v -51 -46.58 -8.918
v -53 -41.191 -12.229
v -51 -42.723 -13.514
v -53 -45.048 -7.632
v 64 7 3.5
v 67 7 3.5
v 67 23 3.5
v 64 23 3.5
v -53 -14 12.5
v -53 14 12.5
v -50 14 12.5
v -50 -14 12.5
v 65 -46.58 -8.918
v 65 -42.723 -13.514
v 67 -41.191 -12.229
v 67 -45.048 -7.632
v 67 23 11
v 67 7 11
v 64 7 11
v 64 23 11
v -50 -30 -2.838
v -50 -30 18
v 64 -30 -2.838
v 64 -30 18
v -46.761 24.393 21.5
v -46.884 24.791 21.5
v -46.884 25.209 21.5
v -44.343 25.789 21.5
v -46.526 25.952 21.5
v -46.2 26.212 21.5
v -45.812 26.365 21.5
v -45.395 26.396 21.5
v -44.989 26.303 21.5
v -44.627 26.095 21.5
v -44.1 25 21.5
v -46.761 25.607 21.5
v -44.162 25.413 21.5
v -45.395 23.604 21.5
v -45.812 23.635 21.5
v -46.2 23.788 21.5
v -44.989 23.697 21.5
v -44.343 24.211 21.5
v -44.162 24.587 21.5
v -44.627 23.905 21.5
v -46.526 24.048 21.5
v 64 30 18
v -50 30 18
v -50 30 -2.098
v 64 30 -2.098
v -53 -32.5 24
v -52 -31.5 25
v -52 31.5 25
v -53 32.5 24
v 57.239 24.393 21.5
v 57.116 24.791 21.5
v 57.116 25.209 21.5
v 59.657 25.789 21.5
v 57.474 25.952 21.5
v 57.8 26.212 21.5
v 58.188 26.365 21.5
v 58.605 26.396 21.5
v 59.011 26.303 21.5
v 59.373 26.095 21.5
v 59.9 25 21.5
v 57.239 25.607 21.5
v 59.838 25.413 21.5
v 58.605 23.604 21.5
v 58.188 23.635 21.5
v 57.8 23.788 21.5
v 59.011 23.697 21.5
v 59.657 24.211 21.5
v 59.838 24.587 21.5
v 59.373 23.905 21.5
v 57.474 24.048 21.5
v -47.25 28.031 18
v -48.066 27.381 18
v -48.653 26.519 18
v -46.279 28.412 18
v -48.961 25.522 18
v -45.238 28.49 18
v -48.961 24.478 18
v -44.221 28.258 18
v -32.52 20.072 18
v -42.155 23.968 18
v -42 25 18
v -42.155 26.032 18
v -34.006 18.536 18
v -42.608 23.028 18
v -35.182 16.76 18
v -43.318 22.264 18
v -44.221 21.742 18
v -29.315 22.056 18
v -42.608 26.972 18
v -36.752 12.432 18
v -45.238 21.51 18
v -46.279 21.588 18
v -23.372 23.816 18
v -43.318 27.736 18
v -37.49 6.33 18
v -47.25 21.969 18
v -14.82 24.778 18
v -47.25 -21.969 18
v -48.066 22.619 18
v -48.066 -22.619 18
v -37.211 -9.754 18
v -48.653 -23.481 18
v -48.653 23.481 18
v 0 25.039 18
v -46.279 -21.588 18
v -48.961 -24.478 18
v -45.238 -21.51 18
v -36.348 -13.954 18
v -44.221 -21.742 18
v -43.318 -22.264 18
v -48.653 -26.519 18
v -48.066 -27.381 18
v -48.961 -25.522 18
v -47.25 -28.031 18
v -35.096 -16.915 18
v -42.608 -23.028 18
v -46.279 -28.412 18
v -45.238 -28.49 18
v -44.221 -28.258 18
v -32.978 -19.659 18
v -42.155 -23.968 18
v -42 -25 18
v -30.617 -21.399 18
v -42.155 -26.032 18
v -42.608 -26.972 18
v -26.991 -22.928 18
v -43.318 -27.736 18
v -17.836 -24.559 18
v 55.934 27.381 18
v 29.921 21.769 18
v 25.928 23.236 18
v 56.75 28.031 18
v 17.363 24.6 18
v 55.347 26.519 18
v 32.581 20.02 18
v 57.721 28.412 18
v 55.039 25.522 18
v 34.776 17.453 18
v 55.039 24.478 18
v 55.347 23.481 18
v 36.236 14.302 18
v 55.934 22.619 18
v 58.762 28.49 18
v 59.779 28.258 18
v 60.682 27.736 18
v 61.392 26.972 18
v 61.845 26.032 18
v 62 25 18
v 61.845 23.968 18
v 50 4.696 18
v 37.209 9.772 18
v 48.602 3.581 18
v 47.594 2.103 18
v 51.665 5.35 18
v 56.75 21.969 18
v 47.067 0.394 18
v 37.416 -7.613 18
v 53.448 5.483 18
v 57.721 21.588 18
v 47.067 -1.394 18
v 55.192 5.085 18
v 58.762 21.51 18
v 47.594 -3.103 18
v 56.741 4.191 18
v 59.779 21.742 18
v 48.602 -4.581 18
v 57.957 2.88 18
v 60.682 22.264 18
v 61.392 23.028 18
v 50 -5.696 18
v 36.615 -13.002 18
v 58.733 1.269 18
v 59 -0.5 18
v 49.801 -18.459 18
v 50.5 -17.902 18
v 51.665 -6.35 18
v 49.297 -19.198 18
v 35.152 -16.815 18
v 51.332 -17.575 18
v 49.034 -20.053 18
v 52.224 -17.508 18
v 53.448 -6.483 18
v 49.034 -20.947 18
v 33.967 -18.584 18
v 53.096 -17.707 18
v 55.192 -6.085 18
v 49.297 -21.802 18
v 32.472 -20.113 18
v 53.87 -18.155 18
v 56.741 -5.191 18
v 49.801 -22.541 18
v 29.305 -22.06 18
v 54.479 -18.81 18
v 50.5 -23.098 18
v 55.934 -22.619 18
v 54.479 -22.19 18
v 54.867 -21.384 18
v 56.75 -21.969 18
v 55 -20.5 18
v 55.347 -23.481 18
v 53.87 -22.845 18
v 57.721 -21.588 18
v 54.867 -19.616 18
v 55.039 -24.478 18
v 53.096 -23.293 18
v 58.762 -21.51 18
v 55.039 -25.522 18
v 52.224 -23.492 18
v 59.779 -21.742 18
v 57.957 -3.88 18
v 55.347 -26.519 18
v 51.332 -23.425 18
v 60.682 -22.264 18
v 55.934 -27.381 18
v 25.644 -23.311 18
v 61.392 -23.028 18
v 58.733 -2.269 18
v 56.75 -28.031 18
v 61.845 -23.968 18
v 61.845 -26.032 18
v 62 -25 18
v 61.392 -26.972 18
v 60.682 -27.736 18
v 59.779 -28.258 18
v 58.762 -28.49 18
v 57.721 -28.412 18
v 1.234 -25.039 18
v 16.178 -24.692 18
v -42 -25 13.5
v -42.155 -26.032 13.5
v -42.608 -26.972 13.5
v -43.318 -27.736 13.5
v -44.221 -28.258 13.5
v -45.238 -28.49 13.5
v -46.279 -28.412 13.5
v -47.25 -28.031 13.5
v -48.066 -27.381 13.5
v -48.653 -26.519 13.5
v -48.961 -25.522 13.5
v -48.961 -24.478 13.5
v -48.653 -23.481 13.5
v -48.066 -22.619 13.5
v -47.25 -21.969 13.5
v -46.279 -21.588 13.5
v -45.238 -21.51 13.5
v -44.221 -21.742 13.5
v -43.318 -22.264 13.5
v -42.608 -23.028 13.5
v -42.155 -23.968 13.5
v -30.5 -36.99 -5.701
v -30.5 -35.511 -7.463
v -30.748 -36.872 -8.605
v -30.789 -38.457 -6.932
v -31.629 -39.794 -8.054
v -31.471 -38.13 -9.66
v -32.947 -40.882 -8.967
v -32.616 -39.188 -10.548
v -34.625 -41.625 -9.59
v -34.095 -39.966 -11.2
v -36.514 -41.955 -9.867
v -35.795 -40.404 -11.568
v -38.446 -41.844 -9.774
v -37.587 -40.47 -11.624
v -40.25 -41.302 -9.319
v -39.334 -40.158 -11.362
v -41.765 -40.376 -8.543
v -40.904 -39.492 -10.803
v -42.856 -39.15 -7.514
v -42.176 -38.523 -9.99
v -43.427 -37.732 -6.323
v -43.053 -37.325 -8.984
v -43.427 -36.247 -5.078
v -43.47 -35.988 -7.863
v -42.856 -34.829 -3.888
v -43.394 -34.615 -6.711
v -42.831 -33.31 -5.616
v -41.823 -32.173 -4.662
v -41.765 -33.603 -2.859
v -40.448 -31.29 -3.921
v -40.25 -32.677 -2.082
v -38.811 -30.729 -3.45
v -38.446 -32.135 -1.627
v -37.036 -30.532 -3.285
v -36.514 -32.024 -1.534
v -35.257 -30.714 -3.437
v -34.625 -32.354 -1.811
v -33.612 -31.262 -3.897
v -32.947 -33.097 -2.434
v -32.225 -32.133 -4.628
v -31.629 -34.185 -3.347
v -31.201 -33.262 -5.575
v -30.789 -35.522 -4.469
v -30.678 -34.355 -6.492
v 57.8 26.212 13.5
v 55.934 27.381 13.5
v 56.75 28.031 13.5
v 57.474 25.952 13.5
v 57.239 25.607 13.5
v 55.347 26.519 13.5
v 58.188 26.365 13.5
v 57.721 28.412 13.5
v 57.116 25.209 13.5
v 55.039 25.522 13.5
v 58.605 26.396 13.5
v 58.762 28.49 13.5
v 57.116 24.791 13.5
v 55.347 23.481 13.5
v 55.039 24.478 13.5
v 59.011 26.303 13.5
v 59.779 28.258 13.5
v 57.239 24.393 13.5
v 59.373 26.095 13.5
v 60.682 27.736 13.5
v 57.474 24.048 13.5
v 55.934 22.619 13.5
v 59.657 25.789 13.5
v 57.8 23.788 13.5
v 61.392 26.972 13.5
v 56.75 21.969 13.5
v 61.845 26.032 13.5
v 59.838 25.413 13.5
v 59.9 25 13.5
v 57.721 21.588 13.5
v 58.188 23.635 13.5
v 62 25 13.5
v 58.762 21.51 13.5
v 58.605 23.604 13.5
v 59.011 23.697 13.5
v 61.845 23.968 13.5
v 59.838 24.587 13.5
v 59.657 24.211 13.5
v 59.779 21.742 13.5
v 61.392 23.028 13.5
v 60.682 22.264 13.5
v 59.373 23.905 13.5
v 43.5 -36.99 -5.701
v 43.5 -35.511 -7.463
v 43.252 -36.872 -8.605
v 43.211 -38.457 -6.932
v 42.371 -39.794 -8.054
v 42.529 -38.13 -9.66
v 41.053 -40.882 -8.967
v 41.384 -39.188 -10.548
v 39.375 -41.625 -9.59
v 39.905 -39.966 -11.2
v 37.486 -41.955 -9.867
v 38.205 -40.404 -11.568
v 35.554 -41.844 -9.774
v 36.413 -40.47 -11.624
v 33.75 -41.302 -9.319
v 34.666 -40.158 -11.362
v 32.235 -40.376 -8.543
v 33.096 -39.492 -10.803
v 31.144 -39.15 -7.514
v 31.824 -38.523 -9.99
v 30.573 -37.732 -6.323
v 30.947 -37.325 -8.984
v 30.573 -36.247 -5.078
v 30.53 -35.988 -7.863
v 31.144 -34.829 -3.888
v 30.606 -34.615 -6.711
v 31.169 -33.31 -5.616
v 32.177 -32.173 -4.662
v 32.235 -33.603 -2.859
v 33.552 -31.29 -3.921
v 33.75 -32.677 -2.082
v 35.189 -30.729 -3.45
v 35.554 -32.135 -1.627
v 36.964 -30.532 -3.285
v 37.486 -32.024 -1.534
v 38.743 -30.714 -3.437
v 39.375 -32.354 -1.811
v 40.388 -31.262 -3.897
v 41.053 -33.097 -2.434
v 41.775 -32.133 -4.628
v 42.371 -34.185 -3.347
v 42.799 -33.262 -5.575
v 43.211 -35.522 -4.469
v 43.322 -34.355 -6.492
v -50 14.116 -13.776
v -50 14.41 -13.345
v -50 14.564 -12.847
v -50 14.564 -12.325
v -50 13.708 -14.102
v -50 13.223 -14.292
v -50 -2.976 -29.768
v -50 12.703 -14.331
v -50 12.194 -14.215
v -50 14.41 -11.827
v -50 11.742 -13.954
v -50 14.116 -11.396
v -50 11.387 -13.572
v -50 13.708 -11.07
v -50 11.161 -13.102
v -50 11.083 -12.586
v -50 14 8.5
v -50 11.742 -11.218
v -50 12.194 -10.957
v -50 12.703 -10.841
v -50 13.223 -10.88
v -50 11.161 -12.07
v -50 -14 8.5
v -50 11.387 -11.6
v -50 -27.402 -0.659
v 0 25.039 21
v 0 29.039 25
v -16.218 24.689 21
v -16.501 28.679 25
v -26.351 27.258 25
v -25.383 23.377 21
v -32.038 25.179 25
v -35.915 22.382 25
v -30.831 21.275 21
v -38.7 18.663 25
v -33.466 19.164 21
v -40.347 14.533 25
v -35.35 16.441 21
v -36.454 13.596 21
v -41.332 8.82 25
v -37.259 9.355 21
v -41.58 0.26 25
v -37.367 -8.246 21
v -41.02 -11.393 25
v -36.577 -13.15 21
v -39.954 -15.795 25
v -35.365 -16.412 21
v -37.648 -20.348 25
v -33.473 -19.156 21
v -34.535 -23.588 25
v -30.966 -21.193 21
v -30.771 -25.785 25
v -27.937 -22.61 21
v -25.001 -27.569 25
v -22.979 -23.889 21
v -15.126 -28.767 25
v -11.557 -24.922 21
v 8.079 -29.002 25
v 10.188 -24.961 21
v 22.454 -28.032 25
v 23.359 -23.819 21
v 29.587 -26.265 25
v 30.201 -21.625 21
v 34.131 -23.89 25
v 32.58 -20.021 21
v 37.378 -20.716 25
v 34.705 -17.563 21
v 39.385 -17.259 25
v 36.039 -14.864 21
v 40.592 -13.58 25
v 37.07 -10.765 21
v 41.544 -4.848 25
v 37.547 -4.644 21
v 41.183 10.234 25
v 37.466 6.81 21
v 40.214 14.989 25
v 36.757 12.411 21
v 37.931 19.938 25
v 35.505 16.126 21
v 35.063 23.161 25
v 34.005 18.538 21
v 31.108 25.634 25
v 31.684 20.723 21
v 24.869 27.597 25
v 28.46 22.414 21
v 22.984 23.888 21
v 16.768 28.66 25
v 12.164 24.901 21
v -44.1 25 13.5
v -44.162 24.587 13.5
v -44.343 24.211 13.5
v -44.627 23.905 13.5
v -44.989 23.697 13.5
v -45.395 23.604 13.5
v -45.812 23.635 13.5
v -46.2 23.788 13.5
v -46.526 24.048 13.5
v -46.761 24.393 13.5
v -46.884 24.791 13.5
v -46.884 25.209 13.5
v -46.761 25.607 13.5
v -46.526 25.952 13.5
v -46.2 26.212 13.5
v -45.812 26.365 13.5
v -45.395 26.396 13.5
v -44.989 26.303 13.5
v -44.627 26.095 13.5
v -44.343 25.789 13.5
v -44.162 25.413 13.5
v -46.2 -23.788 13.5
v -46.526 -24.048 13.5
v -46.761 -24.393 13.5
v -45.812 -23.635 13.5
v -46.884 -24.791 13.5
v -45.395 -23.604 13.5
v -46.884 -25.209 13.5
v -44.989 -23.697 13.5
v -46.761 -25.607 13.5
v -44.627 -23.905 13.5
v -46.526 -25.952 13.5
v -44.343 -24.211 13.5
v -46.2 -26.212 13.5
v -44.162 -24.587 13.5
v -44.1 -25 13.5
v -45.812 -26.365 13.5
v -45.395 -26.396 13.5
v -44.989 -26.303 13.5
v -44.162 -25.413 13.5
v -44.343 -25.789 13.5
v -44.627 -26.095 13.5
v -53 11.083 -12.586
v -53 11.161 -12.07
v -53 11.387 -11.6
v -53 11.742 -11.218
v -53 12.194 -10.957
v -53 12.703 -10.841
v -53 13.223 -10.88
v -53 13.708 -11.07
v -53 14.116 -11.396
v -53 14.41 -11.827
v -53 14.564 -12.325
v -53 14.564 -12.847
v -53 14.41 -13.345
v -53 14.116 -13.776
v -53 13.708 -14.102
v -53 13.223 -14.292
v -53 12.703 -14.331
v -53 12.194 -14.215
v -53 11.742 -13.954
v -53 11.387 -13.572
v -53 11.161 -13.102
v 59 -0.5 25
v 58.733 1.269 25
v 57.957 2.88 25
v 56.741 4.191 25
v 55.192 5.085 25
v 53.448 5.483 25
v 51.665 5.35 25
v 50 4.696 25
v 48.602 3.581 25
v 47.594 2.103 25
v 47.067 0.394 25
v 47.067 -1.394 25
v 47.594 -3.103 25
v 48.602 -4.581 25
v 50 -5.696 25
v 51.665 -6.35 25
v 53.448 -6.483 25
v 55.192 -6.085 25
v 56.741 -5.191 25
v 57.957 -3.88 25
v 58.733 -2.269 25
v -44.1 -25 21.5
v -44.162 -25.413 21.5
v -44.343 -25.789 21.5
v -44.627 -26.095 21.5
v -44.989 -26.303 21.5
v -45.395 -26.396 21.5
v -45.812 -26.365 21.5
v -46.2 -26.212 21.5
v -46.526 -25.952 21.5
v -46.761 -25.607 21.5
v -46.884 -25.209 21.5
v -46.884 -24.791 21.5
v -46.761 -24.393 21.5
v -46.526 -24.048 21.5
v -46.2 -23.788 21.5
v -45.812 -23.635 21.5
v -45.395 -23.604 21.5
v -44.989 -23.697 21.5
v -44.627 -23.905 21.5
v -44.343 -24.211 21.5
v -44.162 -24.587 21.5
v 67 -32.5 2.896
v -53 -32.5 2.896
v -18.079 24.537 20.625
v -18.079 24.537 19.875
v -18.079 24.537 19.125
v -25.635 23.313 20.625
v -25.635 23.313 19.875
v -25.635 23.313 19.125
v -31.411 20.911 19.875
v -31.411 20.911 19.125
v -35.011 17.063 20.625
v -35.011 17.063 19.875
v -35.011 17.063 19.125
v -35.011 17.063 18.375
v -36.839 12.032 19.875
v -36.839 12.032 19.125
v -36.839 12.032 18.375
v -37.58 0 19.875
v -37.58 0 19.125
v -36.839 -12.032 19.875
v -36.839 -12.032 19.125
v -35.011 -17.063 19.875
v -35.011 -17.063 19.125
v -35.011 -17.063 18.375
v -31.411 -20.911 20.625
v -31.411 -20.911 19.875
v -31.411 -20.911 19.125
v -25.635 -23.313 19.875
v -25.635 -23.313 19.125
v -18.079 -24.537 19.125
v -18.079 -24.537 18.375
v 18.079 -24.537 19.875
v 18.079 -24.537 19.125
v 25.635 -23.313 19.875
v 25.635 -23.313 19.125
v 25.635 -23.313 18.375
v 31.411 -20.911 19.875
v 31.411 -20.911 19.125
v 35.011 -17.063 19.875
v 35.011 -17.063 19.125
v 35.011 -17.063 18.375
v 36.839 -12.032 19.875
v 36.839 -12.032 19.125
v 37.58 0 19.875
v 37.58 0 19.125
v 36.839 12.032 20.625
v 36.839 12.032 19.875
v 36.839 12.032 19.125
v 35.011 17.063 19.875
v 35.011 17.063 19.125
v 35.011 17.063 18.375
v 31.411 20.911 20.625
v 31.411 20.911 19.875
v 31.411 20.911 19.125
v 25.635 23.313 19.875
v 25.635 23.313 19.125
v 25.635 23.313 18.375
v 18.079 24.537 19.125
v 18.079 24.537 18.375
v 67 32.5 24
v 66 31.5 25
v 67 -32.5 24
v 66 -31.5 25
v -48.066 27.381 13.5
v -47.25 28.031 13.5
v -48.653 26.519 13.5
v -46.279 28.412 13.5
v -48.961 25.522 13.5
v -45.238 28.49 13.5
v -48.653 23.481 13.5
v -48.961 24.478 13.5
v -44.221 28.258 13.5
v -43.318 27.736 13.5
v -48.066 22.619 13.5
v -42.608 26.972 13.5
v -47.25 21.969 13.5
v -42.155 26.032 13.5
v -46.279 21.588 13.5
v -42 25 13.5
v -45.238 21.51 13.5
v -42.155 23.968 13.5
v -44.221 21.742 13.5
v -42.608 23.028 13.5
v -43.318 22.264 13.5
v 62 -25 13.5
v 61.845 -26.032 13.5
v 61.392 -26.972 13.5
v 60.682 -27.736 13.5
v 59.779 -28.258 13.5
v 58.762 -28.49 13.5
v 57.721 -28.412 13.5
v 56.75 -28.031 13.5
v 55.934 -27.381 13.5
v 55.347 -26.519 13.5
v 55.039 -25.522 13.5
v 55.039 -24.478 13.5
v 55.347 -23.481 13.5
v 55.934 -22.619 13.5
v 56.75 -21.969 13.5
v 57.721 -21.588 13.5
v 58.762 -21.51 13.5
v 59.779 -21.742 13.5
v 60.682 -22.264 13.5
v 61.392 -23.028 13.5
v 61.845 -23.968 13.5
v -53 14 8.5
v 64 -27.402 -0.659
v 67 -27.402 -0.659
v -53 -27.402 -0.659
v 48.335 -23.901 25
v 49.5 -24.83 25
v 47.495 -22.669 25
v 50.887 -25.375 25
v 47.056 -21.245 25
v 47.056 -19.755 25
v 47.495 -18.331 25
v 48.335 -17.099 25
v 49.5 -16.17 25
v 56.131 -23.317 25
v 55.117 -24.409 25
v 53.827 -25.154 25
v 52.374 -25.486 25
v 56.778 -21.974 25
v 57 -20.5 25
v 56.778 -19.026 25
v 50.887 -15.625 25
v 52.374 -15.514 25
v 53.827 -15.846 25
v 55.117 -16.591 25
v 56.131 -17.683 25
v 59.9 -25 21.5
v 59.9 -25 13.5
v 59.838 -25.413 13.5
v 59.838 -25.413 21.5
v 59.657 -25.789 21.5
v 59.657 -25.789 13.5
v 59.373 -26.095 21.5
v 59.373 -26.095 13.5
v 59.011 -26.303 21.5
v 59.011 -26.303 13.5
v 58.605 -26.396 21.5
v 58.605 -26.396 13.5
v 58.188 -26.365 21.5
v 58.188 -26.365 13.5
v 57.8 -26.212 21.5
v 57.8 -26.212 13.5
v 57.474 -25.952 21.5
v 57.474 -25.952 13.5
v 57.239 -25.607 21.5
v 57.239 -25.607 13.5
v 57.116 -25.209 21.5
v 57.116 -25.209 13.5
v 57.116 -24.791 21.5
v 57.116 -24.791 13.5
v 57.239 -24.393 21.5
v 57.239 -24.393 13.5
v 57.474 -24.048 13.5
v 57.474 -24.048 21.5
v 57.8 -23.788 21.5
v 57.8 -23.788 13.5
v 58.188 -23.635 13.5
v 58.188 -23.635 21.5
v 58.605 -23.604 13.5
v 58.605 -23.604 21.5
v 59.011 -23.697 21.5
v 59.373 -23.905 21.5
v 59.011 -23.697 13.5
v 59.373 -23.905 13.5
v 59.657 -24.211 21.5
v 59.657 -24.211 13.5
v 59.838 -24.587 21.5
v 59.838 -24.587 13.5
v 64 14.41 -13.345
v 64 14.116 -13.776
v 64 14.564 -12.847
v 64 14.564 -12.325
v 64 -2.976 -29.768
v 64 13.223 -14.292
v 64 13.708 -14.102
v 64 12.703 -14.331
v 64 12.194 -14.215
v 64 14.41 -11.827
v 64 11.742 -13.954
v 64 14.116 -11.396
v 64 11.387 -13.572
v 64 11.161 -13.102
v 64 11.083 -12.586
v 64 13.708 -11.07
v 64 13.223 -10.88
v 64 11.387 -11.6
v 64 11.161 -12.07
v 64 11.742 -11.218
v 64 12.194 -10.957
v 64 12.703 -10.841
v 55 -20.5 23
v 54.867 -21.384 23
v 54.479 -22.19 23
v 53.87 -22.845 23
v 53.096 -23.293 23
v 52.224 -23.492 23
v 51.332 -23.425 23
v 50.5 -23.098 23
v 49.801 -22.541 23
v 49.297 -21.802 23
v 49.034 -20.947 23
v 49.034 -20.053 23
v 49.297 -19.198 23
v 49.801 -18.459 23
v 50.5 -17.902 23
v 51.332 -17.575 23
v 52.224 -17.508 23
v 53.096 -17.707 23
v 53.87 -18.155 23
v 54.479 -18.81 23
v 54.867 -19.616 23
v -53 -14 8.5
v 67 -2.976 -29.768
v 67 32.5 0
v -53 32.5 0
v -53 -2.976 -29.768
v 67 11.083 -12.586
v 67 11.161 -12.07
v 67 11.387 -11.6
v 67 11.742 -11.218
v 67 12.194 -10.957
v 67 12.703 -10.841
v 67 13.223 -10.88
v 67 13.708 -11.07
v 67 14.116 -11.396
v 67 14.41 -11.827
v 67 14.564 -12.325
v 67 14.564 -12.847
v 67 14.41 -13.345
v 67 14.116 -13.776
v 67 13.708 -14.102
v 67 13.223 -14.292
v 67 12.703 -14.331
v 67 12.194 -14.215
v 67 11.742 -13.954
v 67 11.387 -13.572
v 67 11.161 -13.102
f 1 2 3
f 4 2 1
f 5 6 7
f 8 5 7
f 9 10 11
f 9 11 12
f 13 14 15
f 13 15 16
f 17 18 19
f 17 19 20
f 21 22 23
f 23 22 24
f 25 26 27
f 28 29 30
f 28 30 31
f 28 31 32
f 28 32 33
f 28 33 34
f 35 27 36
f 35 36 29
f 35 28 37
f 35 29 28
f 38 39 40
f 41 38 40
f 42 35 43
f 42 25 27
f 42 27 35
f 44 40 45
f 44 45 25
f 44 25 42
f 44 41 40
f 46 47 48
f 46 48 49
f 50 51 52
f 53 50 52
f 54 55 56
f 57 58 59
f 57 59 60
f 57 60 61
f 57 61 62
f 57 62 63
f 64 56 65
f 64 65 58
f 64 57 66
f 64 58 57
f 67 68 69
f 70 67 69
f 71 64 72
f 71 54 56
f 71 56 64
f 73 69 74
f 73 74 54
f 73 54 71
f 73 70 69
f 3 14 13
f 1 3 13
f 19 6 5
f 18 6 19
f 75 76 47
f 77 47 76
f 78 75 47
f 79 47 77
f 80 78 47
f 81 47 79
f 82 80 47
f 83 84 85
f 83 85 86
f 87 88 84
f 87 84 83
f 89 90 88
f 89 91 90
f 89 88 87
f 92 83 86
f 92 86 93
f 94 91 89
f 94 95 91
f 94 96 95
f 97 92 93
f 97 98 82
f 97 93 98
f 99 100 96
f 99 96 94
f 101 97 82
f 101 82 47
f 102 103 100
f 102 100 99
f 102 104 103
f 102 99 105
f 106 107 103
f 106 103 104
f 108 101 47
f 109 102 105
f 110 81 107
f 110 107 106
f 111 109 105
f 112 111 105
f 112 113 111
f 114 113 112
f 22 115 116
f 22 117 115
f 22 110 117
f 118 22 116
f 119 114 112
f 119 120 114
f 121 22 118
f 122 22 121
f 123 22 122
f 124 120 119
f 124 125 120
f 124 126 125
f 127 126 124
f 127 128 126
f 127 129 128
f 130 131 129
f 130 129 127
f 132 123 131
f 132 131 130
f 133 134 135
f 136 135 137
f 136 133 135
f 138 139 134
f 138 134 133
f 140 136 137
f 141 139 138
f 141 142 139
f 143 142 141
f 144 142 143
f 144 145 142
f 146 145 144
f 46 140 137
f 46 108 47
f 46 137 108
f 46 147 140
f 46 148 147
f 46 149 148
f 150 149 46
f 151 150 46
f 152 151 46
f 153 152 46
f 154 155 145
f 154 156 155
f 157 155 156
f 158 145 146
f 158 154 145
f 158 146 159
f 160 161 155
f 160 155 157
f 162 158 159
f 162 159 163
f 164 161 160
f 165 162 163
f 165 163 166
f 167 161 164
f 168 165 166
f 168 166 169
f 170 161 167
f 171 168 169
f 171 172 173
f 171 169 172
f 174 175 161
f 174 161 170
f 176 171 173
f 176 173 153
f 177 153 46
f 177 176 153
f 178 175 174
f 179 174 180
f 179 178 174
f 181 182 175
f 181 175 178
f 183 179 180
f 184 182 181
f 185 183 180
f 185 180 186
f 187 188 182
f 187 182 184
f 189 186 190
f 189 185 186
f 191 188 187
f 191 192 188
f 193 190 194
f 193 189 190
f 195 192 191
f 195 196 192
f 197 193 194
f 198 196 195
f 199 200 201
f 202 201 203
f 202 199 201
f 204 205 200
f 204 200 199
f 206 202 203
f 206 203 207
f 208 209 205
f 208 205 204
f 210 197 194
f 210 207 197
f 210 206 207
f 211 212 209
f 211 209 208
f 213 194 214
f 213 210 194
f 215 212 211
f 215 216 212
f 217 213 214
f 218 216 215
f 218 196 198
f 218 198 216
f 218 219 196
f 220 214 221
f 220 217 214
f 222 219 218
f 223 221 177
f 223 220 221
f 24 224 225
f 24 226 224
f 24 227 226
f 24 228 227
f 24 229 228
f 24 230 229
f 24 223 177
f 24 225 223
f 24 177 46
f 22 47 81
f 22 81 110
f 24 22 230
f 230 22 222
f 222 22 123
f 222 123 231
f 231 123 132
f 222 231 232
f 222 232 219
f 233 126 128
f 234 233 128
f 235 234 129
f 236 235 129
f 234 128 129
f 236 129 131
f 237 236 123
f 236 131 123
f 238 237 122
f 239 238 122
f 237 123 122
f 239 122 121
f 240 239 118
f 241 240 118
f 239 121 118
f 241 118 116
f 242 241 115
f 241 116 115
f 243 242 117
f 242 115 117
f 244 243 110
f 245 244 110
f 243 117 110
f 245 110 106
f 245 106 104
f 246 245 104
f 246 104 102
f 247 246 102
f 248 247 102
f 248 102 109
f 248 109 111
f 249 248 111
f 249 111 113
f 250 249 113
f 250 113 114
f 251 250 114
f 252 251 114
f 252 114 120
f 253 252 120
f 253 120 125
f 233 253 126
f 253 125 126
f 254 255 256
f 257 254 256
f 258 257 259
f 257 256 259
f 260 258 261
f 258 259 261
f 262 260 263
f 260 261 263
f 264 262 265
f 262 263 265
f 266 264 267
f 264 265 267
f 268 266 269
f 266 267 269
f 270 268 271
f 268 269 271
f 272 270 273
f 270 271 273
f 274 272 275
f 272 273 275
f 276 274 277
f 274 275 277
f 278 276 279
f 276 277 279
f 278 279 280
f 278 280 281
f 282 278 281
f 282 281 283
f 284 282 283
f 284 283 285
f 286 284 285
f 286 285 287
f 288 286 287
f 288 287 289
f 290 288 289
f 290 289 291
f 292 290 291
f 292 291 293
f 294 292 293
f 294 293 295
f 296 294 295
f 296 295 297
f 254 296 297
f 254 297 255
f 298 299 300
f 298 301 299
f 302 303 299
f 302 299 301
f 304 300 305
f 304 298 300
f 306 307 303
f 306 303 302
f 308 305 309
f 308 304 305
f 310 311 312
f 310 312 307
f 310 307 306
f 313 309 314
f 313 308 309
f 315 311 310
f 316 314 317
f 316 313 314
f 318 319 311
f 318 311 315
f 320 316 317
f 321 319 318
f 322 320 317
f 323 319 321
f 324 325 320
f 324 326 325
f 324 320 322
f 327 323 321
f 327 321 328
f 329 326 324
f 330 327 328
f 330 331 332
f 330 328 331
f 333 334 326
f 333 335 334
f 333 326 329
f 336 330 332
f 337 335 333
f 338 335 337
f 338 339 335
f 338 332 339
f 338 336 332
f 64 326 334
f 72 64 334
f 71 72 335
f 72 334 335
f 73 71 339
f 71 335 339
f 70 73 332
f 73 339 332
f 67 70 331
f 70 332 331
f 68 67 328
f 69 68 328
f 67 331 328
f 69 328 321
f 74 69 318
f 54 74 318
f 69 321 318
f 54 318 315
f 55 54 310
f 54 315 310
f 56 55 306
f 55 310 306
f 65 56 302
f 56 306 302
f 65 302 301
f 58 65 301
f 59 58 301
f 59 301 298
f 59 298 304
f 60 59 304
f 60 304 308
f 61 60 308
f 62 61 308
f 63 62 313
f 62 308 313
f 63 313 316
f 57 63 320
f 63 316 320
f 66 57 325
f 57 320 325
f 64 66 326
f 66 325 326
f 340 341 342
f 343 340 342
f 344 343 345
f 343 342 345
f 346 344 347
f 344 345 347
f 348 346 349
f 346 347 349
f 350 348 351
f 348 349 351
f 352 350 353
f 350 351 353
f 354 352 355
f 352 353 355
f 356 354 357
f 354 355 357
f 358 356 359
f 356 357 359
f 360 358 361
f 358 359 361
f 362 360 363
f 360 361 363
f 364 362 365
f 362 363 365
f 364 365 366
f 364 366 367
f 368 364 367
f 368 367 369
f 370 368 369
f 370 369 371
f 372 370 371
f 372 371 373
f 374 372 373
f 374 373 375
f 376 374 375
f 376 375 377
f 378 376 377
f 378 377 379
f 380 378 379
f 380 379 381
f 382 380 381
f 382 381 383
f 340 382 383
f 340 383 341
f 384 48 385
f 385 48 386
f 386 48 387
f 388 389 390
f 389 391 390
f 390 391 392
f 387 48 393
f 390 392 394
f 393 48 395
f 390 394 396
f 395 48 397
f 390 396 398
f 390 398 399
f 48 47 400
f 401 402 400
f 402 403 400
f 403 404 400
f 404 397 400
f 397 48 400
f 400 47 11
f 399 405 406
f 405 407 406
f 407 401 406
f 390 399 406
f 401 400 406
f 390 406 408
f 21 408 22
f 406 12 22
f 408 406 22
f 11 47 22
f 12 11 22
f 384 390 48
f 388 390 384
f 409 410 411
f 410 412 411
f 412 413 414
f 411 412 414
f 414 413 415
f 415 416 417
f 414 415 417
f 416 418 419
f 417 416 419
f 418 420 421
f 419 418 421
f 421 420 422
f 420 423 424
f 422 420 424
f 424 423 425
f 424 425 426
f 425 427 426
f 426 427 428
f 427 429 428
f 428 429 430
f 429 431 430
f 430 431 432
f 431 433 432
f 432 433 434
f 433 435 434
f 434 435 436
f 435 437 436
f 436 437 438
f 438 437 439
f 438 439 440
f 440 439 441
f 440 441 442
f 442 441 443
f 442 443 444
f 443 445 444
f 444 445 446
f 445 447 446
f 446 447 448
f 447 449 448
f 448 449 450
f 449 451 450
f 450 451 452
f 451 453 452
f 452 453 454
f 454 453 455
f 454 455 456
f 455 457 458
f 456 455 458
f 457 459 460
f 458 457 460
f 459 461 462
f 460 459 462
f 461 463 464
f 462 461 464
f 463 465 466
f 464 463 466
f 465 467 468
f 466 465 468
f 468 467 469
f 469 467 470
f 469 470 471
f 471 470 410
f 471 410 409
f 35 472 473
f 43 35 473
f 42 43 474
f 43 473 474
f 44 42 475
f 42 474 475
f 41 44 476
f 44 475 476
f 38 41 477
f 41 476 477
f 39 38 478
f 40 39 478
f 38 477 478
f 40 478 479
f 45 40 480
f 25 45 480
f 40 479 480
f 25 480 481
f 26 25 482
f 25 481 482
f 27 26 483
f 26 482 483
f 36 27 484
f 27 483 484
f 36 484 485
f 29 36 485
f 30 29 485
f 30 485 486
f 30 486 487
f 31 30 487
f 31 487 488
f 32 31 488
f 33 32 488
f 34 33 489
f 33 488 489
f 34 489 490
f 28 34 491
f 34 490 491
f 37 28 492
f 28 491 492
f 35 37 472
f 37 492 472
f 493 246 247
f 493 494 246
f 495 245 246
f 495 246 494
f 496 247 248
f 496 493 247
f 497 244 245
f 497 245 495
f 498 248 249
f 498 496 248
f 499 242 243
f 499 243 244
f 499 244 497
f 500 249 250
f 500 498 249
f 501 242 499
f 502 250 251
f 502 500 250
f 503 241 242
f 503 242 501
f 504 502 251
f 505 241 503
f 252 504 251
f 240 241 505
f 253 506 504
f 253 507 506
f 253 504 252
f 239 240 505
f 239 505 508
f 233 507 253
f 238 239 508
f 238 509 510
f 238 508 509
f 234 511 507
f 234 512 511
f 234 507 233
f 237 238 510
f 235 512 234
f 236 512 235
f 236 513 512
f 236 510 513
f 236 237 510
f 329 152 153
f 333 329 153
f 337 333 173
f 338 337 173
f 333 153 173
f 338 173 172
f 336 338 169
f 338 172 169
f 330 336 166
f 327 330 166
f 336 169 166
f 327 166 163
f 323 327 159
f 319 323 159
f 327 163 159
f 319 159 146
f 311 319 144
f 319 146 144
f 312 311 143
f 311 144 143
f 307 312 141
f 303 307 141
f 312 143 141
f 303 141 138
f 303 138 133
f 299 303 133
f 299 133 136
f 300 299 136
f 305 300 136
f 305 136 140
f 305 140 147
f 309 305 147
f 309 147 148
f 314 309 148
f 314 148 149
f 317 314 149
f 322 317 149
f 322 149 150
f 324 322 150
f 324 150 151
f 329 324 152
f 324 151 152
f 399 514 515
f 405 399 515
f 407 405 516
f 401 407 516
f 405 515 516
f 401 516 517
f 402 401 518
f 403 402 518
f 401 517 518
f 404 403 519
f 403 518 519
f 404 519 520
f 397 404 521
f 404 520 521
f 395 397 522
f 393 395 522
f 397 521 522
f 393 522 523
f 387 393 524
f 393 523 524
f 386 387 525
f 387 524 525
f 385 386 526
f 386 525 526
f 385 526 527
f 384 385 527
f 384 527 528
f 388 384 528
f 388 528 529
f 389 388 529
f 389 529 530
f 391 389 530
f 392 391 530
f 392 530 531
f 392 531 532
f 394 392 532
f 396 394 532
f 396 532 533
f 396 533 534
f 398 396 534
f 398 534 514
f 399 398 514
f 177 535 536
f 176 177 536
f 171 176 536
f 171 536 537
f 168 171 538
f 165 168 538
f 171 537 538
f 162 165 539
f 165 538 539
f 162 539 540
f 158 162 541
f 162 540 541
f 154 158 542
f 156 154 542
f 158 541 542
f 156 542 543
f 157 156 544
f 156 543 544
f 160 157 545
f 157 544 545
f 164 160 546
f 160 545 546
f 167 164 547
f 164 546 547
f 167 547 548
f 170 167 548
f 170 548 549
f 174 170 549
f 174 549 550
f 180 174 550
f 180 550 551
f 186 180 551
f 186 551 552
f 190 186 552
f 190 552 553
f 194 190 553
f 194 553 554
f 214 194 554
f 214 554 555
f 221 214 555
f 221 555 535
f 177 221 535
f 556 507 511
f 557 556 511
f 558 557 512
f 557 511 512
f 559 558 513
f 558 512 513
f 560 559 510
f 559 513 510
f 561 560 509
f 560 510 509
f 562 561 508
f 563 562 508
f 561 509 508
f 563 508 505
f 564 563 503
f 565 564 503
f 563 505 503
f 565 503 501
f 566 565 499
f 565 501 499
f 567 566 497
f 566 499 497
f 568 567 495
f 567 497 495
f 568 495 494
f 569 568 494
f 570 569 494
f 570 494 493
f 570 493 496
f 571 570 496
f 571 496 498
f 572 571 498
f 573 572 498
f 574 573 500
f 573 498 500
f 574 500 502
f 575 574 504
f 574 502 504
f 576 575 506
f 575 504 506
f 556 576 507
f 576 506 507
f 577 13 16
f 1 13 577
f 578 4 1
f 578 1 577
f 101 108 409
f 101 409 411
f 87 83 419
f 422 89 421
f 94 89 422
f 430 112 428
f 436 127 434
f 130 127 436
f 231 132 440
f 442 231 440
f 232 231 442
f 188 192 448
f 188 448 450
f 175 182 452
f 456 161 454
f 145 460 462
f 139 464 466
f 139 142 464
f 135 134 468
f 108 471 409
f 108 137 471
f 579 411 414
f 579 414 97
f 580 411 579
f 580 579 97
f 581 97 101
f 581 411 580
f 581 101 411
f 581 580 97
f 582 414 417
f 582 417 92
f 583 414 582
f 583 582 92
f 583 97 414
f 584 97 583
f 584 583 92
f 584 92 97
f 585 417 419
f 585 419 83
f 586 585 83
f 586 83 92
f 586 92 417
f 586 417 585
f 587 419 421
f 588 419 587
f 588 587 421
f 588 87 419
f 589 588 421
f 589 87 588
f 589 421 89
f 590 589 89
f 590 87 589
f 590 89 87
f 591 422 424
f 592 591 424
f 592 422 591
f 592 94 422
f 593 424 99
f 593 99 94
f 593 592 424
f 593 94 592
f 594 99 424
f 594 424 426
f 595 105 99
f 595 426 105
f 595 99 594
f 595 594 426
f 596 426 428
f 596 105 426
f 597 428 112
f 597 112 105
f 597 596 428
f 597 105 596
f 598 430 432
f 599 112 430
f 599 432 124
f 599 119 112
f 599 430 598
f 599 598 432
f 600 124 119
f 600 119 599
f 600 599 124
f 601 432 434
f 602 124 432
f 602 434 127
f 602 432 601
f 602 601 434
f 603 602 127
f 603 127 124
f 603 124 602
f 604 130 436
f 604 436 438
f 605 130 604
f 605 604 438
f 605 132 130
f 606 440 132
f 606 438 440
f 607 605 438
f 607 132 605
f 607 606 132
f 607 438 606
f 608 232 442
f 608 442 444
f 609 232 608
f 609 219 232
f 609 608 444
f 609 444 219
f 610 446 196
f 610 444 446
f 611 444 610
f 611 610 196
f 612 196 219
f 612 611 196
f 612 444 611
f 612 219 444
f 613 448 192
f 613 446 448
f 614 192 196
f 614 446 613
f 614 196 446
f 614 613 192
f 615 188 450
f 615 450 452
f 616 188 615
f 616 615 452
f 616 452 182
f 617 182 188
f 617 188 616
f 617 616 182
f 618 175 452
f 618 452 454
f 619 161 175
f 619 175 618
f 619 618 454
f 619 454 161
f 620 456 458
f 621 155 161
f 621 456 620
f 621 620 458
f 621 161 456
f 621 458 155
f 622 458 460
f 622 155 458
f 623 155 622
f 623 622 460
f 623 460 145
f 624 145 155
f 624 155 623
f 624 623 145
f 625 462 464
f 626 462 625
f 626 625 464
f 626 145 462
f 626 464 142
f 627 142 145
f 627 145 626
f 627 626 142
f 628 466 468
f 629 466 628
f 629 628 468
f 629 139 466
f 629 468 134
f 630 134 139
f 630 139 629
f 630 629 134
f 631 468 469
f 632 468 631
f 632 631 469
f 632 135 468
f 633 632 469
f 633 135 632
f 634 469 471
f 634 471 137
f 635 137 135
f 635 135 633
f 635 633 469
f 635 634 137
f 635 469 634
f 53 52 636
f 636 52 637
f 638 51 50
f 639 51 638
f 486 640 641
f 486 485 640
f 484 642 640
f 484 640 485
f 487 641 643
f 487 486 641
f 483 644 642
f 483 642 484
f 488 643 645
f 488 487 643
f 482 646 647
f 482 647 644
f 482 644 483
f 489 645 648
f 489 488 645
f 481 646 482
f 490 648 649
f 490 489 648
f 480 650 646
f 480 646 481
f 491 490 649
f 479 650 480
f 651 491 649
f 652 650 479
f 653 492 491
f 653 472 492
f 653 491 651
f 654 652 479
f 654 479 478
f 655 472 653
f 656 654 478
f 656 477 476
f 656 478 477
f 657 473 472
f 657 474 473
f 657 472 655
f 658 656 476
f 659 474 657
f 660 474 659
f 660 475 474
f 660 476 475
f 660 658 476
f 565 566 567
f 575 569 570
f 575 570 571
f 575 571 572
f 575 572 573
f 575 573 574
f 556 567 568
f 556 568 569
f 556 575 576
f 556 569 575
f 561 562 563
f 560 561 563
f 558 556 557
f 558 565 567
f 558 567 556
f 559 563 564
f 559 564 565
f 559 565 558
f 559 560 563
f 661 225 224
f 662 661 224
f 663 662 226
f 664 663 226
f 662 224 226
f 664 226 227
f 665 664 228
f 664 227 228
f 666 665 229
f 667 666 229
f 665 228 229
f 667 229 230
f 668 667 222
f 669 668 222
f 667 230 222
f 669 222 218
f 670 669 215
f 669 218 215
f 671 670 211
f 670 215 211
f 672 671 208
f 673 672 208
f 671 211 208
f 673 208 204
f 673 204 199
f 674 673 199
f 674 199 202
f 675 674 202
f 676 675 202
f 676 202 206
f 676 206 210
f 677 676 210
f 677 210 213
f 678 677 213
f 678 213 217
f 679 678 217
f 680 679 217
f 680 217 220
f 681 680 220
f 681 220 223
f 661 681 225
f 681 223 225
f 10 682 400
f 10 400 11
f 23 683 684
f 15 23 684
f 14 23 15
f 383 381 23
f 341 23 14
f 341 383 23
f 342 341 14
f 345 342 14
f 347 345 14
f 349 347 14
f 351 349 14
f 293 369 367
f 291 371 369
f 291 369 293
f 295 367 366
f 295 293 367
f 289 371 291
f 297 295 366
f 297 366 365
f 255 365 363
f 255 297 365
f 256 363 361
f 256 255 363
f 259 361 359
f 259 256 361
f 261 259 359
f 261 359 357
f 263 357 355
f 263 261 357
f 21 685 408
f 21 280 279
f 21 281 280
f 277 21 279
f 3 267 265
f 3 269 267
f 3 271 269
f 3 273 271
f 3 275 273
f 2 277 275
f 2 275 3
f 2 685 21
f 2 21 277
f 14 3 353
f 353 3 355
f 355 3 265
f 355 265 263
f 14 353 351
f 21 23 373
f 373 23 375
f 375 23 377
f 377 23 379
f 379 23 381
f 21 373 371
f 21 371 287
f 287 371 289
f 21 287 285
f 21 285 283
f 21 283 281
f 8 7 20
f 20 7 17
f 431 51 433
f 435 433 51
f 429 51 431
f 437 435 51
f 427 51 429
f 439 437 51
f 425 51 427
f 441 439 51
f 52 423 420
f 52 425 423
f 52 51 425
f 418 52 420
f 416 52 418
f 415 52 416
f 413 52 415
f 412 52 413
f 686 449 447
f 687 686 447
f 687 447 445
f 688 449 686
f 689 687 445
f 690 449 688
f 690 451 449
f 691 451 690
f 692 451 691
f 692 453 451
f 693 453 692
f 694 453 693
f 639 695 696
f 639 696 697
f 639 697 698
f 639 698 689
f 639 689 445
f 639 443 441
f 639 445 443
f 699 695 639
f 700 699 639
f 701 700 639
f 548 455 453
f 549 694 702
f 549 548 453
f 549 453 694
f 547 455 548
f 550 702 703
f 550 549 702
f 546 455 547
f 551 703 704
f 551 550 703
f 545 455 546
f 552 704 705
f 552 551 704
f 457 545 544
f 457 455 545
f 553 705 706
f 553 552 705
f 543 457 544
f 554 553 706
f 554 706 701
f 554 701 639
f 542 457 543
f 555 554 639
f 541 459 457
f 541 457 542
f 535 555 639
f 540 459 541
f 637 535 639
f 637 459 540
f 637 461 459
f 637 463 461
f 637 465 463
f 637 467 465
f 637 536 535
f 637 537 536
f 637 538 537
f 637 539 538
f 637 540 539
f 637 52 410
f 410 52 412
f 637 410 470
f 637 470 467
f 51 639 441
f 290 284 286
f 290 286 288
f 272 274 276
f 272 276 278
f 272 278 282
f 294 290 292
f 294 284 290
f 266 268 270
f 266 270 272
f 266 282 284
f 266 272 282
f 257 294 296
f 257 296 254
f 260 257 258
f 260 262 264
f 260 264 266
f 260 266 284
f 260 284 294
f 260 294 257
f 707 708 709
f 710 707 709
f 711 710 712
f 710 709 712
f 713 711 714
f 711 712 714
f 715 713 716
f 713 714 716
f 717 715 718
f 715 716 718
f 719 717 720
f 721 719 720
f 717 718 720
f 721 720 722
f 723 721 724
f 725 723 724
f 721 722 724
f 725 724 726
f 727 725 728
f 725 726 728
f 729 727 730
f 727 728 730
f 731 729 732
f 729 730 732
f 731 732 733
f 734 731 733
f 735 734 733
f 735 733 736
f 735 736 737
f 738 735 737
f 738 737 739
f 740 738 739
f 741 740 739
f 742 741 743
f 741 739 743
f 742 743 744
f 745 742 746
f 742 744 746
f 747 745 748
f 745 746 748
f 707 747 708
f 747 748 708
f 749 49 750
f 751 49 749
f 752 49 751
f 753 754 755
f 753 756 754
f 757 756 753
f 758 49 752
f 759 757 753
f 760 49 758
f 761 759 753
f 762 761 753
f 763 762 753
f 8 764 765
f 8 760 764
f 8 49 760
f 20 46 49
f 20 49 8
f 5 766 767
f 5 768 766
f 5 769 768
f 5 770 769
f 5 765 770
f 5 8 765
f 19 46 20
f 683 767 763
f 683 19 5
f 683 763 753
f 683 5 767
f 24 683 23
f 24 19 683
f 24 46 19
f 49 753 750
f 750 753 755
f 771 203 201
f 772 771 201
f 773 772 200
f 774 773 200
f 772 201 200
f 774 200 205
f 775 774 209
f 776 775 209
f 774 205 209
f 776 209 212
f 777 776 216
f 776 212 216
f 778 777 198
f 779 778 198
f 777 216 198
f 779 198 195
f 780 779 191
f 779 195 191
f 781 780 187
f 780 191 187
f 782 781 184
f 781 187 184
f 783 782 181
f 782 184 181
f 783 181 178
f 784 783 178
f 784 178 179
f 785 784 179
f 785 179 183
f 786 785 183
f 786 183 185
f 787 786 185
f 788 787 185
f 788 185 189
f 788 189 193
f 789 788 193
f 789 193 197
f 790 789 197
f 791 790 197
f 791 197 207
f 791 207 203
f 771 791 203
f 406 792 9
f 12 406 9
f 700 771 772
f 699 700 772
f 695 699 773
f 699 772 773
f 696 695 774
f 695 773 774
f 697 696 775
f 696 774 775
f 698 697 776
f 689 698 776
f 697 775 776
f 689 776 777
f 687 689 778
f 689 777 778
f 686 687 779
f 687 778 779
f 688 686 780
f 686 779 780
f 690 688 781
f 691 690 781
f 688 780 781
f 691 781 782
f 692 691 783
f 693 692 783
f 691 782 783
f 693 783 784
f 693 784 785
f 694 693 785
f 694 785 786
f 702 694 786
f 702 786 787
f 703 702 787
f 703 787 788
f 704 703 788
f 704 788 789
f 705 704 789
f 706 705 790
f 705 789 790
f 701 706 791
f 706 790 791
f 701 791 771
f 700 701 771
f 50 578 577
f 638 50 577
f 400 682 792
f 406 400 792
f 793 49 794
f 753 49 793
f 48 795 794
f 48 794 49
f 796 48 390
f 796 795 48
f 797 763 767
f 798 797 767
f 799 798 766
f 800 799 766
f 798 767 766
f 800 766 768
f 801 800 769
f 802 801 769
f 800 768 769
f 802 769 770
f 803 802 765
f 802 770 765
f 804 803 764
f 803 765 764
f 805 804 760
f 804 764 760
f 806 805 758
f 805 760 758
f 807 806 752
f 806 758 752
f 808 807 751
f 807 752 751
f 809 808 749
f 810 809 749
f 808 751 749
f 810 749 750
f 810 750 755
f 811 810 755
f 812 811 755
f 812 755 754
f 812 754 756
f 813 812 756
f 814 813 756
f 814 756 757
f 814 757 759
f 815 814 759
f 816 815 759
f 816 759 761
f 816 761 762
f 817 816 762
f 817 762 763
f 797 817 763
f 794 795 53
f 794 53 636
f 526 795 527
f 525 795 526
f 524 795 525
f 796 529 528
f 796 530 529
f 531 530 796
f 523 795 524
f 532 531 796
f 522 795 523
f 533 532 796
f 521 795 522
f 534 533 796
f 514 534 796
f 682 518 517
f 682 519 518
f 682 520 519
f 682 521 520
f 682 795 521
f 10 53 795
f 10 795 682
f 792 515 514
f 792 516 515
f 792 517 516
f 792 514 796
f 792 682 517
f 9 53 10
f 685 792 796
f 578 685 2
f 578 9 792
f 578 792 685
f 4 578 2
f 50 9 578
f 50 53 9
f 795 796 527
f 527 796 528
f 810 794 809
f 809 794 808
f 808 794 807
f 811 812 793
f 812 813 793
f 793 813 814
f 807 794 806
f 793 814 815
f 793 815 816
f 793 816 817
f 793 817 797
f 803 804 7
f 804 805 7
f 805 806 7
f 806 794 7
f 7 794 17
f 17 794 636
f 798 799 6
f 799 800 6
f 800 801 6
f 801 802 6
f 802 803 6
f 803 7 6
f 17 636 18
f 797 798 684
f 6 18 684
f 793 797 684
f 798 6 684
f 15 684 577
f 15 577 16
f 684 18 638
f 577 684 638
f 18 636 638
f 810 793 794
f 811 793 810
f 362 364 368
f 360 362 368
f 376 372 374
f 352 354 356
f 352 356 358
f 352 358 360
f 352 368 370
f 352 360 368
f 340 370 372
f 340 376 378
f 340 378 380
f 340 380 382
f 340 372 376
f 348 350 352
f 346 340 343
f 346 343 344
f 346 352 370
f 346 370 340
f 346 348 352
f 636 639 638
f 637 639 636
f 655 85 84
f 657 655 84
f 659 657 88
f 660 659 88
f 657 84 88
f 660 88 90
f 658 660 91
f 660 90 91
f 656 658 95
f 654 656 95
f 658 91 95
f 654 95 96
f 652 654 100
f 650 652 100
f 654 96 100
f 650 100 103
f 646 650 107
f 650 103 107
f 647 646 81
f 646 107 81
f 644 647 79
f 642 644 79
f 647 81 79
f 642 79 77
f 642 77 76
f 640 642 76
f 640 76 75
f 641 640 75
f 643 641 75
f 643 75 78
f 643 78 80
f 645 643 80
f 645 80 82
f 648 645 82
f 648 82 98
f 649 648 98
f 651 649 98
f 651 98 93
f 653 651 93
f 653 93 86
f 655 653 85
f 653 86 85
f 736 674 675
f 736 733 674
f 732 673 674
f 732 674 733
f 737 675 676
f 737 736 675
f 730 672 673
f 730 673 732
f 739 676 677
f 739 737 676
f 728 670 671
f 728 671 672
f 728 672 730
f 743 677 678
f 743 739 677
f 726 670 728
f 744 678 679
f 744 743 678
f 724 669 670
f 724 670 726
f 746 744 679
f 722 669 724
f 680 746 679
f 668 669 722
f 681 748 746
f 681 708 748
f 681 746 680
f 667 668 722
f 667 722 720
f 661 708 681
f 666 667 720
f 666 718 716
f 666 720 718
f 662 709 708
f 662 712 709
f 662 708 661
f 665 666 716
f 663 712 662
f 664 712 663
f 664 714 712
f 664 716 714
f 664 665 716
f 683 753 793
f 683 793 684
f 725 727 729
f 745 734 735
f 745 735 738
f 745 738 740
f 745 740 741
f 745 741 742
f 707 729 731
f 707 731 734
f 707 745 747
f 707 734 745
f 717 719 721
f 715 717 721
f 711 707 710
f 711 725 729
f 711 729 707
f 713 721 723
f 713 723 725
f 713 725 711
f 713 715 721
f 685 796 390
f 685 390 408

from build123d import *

# Parameters (mm, degrees)
SKETCH_W        = 120
SKETCH_H        = 65
PAD_DEPTH       = 25
SKETCH004_R     = 3
POCKET001_DEPTH = 25.001
SKETCH001_R     = 6
POCKET_DEPTH    = 25.001
SKETCH005_W     = 114
SKETCH005_H     = 60
POCKET002_DEPTH = 18
CHAMFER_SIZE    = 4
SKETCH006_R     = 3.5
PAD001_DEPTH    = 4.5
SKETCH007_R     = 1.4
POCKET003_DEPTH = 8
SKETCH008_W     = 16
SKETCH008_H     = 6.5
POCKET004_DEPTH = 9
SKETCH009_W     = 28
SKETCH009_H     = 4
POCKET005_DEPTH = 5
PAD002_DEPTH    = 120
SKETCH015_W     = 114
SKETCH015_H     = 60
POCKET006_DEPTH = 47
SKETCH016_W     = 16
SKETCH016_H     = 7.5
POCKET007_DEPTH = 9
CHAMFER001_SIZE = 2
SKETCH022_R     = 1.75
POCKET010_DEPTH = 120.001
CHAMFER005_SIZE = 2
CHAMFER006_SIZE = 2
SKETCH023_R     = 6.5
POCKET011_DEPTH = 2.3
CHAMFER007_SIZE = 1


with BuildPart() as part:
    # Sketch → Pad (new body)
    with BuildSketch(Plane.XY):
        with Locations((7, 0)):
            Rectangle(SKETCH_W, SKETCH_H)
        with BuildLine():
            add(Edge.make_bspline(
                [(0, 25.038668), (-12.580271, 25.038668), (-37.740814, 25.116003), (-37.5, 0), (-37.740814, -25.116003), (0, -25), (37.740814, -25.116003), (37.5, 0), (37.740814, 25.116003), (12.580271, 25.038668), (0, 25.038668)],
                knots=[0, 0, 0, 0, 0.125, 0.25, 0.375, 0.5, 0.625, 0.75, 0.875, 1, 1, 1, 1], degree=3))
        make_face(mode=Mode.SUBTRACT)
    extrude(amount=PAD_DEPTH)

    # Sketch004 → Pocket001 (cut, through all)
    with BuildSketch(Plane(origin=(0, 0, 0), x_dir=(1, 0, 0), z_dir=(0, 0, -1))):
        with Locations((52, 20.5)):
            Circle(SKETCH004_R)
    extrude(amount=-POCKET001_DEPTH, mode=Mode.SUBTRACT)

    # Sketch001 (on Face5 of Pocket001) → Pocket (cut, through all)
    with BuildSketch(Plane.XY.offset(25)):
        with Locations((53, -0.5)):
            Circle(SKETCH001_R)
    extrude(amount=-POCKET_DEPTH, mode=Mode.SUBTRACT)

    # Sketch005 (on Face4 of Pocket) → Pocket002 (cut)
    with BuildSketch(Plane(origin=(0, 0, 0), x_dir=(1, 0, 0), z_dir=(0, 0, -1))):
        with Locations((7, 0)):
            Rectangle(SKETCH005_W, SKETCH005_H)
    extrude(amount=-POCKET002_DEPTH, mode=Mode.SUBTRACT)

    # Chamfer
    chamfer_edges = [part.edges().sort_by_distance(p)[0] for p in [
        (0, -25.038668, 25),
    ]]
    chamfer(chamfer_edges, length=CHAMFER_SIZE)

    # Sketch006 (on Face11 of Chamfer) → Pad001 (join)
    with BuildSketch(Plane(origin=(0, 0, 18), x_dir=(1, 0, 0), z_dir=(0, 0, -1))):
        with Locations((-45.5, 25)):
            Circle(SKETCH006_R)
        with Locations((-45.5, -25)):
            Circle(SKETCH006_R)
        with Locations((58.5, -25)):
            Circle(SKETCH006_R)
        with Locations((58.5, 25)):
            Circle(SKETCH006_R)
    extrude(amount=PAD001_DEPTH)

    # Sketch007 (on Face22 of Pad001) → Pocket003 (cut)
    with BuildSketch(Plane(origin=(0, 0, 13.5), x_dir=(1, 0, 0), z_dir=(0, 0, -1))):
        with Locations((-45.5, 25)):
            Circle(SKETCH007_R)
        with Locations((58.5, 25)):
            Circle(SKETCH007_R)
        with Locations((58.5, -25)):
            Circle(SKETCH007_R)
        with Locations((-45.5, -25)):
            Circle(SKETCH007_R)
    extrude(amount=-POCKET003_DEPTH, mode=Mode.SUBTRACT)

    # Sketch008 (on Face5 of Pocket003) → Pocket004 (cut)
    with BuildSketch(Plane.YZ.offset(67)):
        with Locations((15, 3.25)):
            Rectangle(SKETCH008_W, SKETCH008_H)
    extrude(amount=-POCKET004_DEPTH, mode=Mode.SUBTRACT)

    # Sketch009 (on Face4 of Pocket004) → Pocket005 (cut)
    with BuildSketch(Plane(origin=(-53, 0, 0), x_dir=(0, -1, 0), z_dir=(-1, 0, 0))):
        with Locations((0, 10.5)):
            Rectangle(SKETCH009_W, SKETCH009_H)
    extrude(amount=-POCKET005_DEPTH, mode=Mode.SUBTRACT)

    # Sketch010 (on Face4 of Pocket005) → Pad002 (join)
    with BuildSketch(Plane(origin=(-53, 0, 0), x_dir=(0, -1, 0), z_dir=(-1, 0, 0))):
        Polygon((2.976444, -29.768271), (27.402373, -0.658582), (42.723262, -13.514335), (46.579988, -8.918068), (27.480858, 7.108005), (-32.5, 7.108005), (-32.5, 0), align=None)
    extrude(amount=-PAD002_DEPTH)

    # Sketch015 → Pocket006 (cut)
    with BuildSketch(Plane(origin=(0, 0, 13.5), x_dir=(1, 0, 0), z_dir=(0, 0, -1))):
        with Locations((7, 0)):
            Rectangle(SKETCH015_W, SKETCH015_H)
    extrude(amount=POCKET006_DEPTH, mode=Mode.SUBTRACT)

    # Sketch016 (on Face5 of Pocket006) → Pocket007 (cut)
    with BuildSketch(Plane.YZ.offset(67)):
        with Locations((15, 7.25)):
            Rectangle(SKETCH016_W, SKETCH016_H)
    extrude(amount=-POCKET007_DEPTH, mode=Mode.SUBTRACT)

    # Chamfer001
    chamfer001_edges = [part.edges().sort_by_distance(p)[0] for p in [
        (49, -20.5, 25),
    ]]
    chamfer(chamfer001_edges, length=CHAMFER001_SIZE)

    # Sketch022 (on Face25 of Chamfer001) → Pocket010 (cut, through all)
    with BuildSketch(Plane(origin=(-53, 0, 0), x_dir=(0, -1, 0), z_dir=(-1, 0, 0))):
        with Locations((-12.833415, -12.586002)):
            Circle(SKETCH022_R)
    extrude(amount=-POCKET010_DEPTH, mode=Mode.SUBTRACT)

    # Chamfer005
    chamfer005_edges = [part.edges().sort_by_distance(p)[0] for p in [
        (67, -44.651625, -11.216201),
    ]]
    chamfer(chamfer005_edges, length=CHAMFER005_SIZE)

    # Chamfer006
    chamfer006_edges = [part.edges().sort_by_distance(p)[0] for p in [
        (-53, -44.651625, -11.216201),
    ]]
    chamfer(chamfer006_edges, length=CHAMFER006_SIZE)

    # Sketch023 (on Face8 of Chamfer006) → Pocket011 (cut)
    with BuildSketch(Plane(origin=(0, -10.997712, 13.106563), x_dir=(1, 0, 0), z_dir=(0, 0.642788, -0.766044))):
        with Locations((-37, 32)):
            Circle(SKETCH023_R)
        with Locations((37, 32)):
            Circle(SKETCH023_R)
    extrude(amount=-POCKET011_DEPTH, mode=Mode.SUBTRACT)

    # Chamfer007
    chamfer007_edges = [part.edges().sort_by_distance(p)[0] for p in [
        (7, 32.5, 25),
        (67, 0, 25),
        (7, -32.5, 25),
        (-53, 0, 25),
    ]]
    chamfer(chamfer007_edges, length=CHAMFER007_SIZE)


solid = part.part
